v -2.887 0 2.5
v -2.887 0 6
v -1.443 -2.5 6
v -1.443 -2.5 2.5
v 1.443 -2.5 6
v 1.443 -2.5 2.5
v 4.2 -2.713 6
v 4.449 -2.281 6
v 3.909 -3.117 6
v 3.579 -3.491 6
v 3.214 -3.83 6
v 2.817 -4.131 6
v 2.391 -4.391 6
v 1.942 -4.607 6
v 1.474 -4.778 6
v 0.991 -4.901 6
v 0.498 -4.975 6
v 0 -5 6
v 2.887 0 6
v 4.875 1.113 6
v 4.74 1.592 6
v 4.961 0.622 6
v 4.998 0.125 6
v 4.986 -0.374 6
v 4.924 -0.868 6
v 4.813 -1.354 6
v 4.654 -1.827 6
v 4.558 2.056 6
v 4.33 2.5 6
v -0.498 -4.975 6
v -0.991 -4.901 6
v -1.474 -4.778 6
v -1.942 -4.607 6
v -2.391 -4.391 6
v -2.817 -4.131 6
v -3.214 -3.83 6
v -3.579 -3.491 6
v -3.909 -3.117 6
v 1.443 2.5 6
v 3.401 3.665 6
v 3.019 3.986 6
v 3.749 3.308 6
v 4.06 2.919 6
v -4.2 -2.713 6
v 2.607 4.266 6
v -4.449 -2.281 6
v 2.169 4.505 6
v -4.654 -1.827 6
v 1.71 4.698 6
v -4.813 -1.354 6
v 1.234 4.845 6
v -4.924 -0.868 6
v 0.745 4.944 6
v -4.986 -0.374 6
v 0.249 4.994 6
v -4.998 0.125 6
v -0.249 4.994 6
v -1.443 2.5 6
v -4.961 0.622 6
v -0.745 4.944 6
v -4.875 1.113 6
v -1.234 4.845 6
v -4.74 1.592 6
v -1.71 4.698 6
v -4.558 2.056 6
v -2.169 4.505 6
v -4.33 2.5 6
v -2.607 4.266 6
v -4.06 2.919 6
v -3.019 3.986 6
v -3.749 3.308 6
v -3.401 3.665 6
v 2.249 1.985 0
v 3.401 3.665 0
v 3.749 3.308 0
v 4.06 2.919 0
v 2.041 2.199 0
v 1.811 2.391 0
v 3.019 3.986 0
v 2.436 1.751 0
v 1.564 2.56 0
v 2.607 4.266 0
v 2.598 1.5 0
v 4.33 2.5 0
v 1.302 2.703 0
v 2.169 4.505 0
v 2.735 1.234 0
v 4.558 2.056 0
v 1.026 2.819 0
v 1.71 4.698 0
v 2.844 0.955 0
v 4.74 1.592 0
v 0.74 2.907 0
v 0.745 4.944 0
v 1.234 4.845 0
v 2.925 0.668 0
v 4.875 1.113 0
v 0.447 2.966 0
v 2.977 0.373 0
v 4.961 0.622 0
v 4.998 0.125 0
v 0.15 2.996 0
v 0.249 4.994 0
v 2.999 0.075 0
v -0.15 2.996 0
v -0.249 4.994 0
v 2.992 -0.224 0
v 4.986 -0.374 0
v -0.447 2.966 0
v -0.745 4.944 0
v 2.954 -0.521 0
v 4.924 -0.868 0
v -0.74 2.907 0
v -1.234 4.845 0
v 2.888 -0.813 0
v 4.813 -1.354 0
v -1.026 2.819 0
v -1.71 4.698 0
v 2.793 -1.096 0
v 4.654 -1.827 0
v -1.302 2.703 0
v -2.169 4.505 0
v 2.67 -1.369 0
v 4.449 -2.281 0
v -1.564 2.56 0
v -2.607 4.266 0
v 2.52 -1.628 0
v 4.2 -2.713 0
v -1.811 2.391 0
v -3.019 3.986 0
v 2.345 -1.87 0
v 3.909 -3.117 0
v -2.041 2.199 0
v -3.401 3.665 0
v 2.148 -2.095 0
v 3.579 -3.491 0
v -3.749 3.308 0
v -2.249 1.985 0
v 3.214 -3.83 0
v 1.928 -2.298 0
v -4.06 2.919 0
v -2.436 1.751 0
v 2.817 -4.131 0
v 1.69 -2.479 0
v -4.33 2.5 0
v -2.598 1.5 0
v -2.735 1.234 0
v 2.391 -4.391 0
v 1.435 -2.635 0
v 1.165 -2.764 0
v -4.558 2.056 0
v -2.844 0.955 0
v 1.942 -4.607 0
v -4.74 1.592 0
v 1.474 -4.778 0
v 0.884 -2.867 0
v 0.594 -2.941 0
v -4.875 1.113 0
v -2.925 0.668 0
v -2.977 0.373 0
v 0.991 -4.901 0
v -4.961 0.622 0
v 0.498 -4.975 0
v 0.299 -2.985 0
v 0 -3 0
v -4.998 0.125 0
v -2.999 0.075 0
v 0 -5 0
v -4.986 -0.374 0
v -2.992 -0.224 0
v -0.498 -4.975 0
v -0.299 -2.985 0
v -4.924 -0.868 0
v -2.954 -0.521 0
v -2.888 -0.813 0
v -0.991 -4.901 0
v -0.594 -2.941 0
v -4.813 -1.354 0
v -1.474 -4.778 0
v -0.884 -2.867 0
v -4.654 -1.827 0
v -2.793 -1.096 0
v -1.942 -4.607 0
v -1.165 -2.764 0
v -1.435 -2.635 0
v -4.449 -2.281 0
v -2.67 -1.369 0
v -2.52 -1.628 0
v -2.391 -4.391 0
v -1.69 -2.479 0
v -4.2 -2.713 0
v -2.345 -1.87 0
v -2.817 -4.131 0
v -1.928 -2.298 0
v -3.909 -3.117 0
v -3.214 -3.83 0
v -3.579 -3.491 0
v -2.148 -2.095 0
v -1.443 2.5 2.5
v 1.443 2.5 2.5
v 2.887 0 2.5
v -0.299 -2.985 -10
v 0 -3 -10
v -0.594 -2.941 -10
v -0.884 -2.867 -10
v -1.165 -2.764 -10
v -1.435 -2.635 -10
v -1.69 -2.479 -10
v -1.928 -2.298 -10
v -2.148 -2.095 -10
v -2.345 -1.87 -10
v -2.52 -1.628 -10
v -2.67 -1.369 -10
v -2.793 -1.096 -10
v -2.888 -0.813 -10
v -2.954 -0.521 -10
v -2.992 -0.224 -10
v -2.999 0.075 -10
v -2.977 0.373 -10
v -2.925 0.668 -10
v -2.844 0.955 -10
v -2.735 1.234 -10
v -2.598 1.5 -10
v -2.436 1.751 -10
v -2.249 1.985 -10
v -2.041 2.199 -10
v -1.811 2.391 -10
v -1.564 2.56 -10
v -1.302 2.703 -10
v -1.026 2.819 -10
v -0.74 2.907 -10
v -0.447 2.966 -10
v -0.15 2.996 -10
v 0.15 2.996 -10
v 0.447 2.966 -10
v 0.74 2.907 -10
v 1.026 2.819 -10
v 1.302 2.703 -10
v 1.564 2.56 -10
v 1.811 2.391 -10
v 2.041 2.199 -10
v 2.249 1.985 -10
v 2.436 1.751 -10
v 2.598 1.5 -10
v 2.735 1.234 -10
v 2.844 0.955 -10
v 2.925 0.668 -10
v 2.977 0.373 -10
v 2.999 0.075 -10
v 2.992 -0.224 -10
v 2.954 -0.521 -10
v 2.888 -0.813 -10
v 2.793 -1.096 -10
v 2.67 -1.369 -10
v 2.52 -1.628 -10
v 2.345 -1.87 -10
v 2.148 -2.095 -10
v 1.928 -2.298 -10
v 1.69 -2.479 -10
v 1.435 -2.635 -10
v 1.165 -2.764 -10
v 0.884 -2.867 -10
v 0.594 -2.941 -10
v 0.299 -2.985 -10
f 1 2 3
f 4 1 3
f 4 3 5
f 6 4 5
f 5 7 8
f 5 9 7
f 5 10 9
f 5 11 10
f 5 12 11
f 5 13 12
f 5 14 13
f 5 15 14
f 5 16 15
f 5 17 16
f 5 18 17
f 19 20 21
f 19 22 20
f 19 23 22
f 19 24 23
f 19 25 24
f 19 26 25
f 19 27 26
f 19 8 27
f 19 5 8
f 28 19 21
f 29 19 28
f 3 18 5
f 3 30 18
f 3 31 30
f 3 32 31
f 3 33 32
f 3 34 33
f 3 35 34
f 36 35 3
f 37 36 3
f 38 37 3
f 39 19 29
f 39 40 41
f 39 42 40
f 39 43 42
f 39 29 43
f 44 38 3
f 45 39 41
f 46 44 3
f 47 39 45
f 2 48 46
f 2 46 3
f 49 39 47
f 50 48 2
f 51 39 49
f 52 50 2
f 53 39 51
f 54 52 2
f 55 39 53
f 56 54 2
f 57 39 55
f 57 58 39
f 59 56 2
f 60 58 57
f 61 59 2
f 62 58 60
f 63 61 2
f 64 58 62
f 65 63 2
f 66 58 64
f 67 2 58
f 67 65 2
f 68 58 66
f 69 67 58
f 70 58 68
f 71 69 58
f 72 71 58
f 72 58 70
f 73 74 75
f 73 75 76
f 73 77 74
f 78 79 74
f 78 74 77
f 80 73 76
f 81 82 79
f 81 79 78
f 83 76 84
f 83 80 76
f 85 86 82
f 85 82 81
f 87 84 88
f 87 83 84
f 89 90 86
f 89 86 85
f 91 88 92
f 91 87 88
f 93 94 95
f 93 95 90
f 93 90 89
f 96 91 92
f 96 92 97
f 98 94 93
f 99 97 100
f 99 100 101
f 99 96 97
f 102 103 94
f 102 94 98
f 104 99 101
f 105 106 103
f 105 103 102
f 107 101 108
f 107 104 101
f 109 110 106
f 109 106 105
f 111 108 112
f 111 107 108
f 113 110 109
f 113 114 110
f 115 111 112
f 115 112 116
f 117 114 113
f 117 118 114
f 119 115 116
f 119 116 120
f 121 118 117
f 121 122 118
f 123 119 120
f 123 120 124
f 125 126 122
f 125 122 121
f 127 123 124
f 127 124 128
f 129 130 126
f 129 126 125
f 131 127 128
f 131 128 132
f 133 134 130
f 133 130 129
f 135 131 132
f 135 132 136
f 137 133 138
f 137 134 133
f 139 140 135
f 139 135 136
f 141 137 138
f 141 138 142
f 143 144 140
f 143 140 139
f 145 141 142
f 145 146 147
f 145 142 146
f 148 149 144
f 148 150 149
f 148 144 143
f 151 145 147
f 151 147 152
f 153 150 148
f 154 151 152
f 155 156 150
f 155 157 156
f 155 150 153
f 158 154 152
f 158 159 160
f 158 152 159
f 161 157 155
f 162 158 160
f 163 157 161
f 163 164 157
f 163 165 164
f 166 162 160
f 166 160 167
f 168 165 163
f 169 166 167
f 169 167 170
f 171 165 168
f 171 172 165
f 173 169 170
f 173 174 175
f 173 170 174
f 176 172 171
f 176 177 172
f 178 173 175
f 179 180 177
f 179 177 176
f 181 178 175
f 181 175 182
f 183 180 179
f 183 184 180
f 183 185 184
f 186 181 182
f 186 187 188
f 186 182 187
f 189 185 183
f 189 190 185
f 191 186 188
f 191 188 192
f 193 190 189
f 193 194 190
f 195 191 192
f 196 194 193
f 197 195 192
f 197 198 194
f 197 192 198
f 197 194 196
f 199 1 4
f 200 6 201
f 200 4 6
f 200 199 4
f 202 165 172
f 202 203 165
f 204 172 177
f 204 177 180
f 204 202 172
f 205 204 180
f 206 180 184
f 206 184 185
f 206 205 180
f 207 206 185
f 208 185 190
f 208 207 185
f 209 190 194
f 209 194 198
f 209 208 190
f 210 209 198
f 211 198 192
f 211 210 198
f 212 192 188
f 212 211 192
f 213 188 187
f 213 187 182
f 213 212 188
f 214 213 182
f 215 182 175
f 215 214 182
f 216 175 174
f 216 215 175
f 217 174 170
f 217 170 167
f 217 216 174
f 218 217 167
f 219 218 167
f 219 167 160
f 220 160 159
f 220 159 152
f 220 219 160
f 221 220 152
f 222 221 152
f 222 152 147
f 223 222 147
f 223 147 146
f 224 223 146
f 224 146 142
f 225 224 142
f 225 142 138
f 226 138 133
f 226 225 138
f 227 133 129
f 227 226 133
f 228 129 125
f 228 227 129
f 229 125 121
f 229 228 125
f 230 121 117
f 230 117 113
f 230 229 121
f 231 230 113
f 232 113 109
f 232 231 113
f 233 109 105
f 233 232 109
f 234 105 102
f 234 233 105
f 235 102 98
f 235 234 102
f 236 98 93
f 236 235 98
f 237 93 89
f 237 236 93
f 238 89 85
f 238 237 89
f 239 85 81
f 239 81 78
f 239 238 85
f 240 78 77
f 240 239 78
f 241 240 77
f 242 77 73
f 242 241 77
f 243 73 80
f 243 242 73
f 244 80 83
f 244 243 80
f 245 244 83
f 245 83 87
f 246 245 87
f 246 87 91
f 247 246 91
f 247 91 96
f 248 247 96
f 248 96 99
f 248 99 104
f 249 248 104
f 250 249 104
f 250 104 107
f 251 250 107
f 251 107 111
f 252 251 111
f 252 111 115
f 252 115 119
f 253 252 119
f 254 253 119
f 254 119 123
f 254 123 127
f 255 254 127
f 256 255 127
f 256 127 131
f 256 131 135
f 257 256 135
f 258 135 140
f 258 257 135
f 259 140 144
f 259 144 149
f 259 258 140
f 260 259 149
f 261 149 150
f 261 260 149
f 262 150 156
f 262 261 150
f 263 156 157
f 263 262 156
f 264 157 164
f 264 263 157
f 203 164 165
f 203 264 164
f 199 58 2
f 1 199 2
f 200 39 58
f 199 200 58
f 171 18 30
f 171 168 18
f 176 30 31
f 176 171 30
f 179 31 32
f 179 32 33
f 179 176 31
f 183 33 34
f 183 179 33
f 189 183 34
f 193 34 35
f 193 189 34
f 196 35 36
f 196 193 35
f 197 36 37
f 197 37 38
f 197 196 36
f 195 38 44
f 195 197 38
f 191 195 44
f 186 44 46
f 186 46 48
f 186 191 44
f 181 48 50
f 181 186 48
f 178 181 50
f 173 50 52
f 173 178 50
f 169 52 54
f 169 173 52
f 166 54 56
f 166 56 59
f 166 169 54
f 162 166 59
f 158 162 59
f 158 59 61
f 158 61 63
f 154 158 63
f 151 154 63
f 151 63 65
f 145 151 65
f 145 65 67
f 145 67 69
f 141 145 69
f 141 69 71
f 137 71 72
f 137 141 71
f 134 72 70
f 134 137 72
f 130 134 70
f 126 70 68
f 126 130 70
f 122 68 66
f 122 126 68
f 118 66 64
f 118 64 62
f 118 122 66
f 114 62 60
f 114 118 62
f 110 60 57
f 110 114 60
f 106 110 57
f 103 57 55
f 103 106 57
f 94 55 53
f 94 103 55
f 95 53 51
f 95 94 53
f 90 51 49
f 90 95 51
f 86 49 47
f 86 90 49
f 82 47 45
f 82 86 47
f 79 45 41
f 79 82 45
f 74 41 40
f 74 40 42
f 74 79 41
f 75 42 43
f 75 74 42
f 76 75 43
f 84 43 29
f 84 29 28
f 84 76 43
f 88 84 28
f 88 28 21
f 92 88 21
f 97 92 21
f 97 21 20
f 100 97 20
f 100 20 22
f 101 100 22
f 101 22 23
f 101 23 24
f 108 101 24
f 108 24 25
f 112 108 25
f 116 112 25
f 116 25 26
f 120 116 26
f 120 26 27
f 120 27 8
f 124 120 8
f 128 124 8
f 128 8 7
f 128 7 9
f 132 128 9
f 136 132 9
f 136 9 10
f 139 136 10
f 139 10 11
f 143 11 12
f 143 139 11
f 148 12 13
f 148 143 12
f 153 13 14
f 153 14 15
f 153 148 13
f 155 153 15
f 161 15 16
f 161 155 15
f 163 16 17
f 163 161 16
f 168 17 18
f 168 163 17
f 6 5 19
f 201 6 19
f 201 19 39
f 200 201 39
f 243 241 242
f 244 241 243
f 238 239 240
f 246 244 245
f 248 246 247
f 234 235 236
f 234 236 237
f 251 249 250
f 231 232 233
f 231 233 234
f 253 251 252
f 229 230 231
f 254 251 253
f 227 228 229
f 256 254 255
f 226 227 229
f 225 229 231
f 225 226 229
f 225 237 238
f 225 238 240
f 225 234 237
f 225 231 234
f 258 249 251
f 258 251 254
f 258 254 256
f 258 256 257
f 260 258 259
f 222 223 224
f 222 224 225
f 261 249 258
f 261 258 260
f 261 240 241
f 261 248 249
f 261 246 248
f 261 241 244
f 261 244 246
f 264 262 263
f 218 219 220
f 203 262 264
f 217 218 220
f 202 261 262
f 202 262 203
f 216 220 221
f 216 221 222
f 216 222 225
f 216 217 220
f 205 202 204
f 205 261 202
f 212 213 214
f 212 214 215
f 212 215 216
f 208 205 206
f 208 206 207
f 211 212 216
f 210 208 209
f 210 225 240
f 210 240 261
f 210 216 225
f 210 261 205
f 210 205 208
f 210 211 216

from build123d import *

# Parameters (mm, degrees)
CUT_EXTRUDE1_DEPTH = 3.5


with BuildPart() as part:
    # Sketch1 → Revolve1 (revolve)
    with BuildSketch(Plane(origin=(0, 0, 0), x_dir=(0, 0, -1), z_dir=(1, 0, 0))):
        Polygon((-6, 0), (-6, 5), (0, 5), (0, 3), (10, 3), (10, 0), align=None)
    revolve(axis=Axis((0, 0, 5.584882278), (0, 0, -1)))

    # Sketch2 → Cut-Extrude1 (cut)
    with BuildSketch(Plane.XY.offset(6)):
        Polygon((1.443375673, -2.5), (2.886751346, 0), (1.443375673, 2.5), (-1.443375673, 2.5), (-2.886751346, 0), (-1.443375673, -2.5), align=None)
    extrude(amount=-CUT_EXTRUDE1_DEPTH, mode=Mode.SUBTRACT)


solid = part.part
